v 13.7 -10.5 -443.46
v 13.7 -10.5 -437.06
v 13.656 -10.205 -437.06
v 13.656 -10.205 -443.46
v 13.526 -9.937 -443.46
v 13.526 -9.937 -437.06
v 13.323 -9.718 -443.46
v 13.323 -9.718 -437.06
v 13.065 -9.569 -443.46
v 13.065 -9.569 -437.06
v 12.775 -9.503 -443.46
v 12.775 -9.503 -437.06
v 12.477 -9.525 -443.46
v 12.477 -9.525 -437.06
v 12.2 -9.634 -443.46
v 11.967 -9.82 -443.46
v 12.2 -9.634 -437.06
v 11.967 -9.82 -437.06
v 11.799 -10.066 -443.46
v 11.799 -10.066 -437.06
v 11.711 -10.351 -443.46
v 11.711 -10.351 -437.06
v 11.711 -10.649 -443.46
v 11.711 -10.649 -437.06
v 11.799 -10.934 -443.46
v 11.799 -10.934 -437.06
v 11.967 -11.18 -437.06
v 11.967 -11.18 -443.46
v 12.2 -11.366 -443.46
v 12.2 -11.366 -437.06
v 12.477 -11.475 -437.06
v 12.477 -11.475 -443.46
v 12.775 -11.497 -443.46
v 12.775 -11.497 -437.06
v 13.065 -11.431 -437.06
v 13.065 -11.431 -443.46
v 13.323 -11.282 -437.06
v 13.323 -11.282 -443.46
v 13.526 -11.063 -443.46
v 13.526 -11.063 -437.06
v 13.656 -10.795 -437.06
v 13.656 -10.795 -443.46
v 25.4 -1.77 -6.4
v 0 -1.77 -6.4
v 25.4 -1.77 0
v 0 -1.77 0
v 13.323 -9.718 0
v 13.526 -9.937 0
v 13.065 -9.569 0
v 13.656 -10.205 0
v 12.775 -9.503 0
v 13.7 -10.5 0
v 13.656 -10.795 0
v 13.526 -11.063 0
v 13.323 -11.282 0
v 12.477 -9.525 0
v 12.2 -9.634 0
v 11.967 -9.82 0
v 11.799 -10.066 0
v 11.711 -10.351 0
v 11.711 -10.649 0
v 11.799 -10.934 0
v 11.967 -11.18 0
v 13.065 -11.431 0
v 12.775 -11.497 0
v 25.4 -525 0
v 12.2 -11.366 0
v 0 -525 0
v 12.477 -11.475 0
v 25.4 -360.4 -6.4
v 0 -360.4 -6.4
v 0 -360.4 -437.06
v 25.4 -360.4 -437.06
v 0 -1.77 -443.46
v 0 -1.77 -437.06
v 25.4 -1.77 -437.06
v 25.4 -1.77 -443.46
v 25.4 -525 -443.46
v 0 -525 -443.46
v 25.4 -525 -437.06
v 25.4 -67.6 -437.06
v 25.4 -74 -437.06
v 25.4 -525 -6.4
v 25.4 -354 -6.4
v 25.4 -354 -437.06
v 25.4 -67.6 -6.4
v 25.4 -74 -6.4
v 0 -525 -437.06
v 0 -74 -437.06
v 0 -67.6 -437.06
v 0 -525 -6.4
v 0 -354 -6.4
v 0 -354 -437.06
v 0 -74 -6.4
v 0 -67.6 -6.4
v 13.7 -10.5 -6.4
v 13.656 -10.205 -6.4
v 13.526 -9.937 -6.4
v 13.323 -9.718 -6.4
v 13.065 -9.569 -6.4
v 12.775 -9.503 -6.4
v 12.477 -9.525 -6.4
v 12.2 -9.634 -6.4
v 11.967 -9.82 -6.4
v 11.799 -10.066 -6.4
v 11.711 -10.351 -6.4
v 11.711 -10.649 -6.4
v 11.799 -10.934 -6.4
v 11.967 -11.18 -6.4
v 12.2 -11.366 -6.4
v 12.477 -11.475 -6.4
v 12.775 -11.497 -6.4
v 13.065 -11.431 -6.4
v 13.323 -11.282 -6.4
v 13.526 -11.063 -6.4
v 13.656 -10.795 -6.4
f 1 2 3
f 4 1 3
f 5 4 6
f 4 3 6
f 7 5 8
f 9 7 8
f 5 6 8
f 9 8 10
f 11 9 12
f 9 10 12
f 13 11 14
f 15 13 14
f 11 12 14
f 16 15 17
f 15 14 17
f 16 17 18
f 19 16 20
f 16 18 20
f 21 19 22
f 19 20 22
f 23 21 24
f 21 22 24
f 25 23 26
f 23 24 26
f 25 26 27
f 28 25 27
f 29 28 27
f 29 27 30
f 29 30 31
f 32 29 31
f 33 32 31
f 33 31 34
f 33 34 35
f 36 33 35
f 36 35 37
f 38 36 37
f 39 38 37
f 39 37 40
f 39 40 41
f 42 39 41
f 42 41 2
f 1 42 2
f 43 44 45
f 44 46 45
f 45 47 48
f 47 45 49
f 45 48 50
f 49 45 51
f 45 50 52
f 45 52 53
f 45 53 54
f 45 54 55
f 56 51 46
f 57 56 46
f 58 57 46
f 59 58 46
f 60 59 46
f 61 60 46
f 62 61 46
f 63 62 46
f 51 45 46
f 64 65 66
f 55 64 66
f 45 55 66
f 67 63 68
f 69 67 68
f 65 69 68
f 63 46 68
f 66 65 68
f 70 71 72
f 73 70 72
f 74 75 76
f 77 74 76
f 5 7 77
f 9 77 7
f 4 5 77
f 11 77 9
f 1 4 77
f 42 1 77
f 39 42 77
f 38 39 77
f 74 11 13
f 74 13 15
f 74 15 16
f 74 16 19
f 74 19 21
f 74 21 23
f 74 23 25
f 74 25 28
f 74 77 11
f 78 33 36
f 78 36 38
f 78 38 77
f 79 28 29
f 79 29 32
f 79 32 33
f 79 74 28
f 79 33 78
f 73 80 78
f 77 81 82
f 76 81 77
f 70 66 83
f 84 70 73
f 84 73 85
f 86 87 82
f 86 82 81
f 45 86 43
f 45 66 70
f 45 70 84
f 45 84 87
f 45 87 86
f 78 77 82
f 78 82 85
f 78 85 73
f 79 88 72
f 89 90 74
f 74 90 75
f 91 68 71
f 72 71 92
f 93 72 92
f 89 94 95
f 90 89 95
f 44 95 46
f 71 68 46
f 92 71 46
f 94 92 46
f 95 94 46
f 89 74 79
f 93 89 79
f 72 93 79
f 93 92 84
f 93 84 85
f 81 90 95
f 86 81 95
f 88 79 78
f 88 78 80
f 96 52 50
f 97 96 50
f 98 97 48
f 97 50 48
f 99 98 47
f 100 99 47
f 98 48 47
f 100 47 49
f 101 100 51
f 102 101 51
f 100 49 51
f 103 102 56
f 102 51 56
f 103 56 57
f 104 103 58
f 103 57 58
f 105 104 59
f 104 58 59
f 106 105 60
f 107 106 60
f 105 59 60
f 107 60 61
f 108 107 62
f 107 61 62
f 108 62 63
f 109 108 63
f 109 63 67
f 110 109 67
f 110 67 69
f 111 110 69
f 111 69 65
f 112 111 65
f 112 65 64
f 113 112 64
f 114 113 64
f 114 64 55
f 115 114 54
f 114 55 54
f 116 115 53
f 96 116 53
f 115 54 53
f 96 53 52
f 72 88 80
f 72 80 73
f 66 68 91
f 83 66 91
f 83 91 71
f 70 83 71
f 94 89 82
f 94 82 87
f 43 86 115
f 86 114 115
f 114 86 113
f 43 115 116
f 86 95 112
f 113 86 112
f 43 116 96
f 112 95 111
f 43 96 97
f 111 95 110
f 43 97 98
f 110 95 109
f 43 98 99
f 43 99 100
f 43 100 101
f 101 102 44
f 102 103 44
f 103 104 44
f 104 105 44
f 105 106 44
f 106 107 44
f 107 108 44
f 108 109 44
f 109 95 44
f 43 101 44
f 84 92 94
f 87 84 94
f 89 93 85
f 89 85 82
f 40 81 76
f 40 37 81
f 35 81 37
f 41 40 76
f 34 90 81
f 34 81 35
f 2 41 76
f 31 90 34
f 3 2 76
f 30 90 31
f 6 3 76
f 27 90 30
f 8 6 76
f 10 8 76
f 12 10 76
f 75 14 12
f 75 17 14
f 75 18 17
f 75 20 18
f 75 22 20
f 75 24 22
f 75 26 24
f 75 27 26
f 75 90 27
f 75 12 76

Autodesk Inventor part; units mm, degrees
ref_plane "YZ Plane" through (0, 0, 0) normal (1, 0, 0) x (0, 1, 0)
ref_plane "XZ Plane" through (0, 0, 0) normal (0, 1, 0) x (-1, 0, 0)
ref_plane "XY Plane" through (0, 0, 0) normal (0, 0, 1) x (1, 0, 0)
sketch "Boceto1" plane through (0, 0, 0) normal (1, 0, 0) x (0, 1, 0)
  line L0 (0, 0) -> (-525, 0)
  line L1 (-525, 0) -> (-525, -6.4)
  line L2 (-525, -6.4) -> (0, -6.4)
  line L3 (0, -6.4) -> (0, 0)
  line L4 (-525, -6.4) -> (-354, -6.4)
  line L5 (-354, -6.4) -> (-354, -7.7448)
  line L6 (-354, -6.4) -> (-354, -437.06)
  line L7 (-354, -6.4) -> (-360.4, -6.4)
  line L8 (-360.4, -6.4) -> (-360.4, -437.06)
  line L9 (0, -443.46) -> (-525, -443.46)
  line L10 (-525, -443.46) -> (-525, -437.06)
  line L11 (-525, -437.06) -> (0, -437.06)
  line L12 (0, -437.06) -> (0, -443.46)
  line L13 (-354, -437.06) -> (-74, -437.06)
  line L14 (-74, -437.06) -> (-74, -6.4)
  line L15 (-74, -437.06) -> (-67.6, -437.06)
  line L16 (-67.6, -437.06) -> (-67.6, -6.4)
  dimension "d0" = 525
  dimension "d1" = 6.4
  dimension "d2" = 171
  dimension "d3" = 430.66
  dimension "d4" = 6.4
  dimension "d5" = 430.66
  dimension "d6" = 280
  dimension "d7" = 6.4
extrude "Extrusión1" add sketch "Boceto1" along normal blind 25.4 contours L3 L2 L1 L0 | L16 L11 L14 L2 | L2 L5 L6 L11 L8 | L11 L12 L9 L10
sketch "Boceto2" plane through (0, -525, 0) normal (0, 0, 1) x (1, 0, 0)
  line L0 (0, 525) -> (0, 523.23)
  line L1 (0, 525) -> (0, 0) projected
  line L2 (0, 523.23) -> (25.4, 523.23)
  line L3 (25.4, 525) -> (25.4, 0) projected
  line L4 (25.4, 525) -> (0, 525)
  dimension "d10" = 1.77
extrude "Extrusión2" cut sketch "Boceto2" against normal through all
sketch "Boceto3" plane through (0, -525, 0) normal (0, 0, 1) x (1, 0, 0)
  line L0 (0, 523.23) -> (25.4, 523.23) projected
  line L1 (25.4, 523.23) -> (25.4, 514.5)
  line L2 (25.4, 0) -> (25.4, 523.23) projected
  line L3 (25.4, 514.5) -> (12.7, 514.5)
  circle A0 centre (12.7, 514.5) radius 1
  point P0 (0, 525)
  dimension "d13" = 8.73
  dimension "d14" = 12.7
  dimension "d15" = 2
extrude "Extrusión3" cut sketch "Boceto3" against normal through all
properties part number "Soporte_molde"
